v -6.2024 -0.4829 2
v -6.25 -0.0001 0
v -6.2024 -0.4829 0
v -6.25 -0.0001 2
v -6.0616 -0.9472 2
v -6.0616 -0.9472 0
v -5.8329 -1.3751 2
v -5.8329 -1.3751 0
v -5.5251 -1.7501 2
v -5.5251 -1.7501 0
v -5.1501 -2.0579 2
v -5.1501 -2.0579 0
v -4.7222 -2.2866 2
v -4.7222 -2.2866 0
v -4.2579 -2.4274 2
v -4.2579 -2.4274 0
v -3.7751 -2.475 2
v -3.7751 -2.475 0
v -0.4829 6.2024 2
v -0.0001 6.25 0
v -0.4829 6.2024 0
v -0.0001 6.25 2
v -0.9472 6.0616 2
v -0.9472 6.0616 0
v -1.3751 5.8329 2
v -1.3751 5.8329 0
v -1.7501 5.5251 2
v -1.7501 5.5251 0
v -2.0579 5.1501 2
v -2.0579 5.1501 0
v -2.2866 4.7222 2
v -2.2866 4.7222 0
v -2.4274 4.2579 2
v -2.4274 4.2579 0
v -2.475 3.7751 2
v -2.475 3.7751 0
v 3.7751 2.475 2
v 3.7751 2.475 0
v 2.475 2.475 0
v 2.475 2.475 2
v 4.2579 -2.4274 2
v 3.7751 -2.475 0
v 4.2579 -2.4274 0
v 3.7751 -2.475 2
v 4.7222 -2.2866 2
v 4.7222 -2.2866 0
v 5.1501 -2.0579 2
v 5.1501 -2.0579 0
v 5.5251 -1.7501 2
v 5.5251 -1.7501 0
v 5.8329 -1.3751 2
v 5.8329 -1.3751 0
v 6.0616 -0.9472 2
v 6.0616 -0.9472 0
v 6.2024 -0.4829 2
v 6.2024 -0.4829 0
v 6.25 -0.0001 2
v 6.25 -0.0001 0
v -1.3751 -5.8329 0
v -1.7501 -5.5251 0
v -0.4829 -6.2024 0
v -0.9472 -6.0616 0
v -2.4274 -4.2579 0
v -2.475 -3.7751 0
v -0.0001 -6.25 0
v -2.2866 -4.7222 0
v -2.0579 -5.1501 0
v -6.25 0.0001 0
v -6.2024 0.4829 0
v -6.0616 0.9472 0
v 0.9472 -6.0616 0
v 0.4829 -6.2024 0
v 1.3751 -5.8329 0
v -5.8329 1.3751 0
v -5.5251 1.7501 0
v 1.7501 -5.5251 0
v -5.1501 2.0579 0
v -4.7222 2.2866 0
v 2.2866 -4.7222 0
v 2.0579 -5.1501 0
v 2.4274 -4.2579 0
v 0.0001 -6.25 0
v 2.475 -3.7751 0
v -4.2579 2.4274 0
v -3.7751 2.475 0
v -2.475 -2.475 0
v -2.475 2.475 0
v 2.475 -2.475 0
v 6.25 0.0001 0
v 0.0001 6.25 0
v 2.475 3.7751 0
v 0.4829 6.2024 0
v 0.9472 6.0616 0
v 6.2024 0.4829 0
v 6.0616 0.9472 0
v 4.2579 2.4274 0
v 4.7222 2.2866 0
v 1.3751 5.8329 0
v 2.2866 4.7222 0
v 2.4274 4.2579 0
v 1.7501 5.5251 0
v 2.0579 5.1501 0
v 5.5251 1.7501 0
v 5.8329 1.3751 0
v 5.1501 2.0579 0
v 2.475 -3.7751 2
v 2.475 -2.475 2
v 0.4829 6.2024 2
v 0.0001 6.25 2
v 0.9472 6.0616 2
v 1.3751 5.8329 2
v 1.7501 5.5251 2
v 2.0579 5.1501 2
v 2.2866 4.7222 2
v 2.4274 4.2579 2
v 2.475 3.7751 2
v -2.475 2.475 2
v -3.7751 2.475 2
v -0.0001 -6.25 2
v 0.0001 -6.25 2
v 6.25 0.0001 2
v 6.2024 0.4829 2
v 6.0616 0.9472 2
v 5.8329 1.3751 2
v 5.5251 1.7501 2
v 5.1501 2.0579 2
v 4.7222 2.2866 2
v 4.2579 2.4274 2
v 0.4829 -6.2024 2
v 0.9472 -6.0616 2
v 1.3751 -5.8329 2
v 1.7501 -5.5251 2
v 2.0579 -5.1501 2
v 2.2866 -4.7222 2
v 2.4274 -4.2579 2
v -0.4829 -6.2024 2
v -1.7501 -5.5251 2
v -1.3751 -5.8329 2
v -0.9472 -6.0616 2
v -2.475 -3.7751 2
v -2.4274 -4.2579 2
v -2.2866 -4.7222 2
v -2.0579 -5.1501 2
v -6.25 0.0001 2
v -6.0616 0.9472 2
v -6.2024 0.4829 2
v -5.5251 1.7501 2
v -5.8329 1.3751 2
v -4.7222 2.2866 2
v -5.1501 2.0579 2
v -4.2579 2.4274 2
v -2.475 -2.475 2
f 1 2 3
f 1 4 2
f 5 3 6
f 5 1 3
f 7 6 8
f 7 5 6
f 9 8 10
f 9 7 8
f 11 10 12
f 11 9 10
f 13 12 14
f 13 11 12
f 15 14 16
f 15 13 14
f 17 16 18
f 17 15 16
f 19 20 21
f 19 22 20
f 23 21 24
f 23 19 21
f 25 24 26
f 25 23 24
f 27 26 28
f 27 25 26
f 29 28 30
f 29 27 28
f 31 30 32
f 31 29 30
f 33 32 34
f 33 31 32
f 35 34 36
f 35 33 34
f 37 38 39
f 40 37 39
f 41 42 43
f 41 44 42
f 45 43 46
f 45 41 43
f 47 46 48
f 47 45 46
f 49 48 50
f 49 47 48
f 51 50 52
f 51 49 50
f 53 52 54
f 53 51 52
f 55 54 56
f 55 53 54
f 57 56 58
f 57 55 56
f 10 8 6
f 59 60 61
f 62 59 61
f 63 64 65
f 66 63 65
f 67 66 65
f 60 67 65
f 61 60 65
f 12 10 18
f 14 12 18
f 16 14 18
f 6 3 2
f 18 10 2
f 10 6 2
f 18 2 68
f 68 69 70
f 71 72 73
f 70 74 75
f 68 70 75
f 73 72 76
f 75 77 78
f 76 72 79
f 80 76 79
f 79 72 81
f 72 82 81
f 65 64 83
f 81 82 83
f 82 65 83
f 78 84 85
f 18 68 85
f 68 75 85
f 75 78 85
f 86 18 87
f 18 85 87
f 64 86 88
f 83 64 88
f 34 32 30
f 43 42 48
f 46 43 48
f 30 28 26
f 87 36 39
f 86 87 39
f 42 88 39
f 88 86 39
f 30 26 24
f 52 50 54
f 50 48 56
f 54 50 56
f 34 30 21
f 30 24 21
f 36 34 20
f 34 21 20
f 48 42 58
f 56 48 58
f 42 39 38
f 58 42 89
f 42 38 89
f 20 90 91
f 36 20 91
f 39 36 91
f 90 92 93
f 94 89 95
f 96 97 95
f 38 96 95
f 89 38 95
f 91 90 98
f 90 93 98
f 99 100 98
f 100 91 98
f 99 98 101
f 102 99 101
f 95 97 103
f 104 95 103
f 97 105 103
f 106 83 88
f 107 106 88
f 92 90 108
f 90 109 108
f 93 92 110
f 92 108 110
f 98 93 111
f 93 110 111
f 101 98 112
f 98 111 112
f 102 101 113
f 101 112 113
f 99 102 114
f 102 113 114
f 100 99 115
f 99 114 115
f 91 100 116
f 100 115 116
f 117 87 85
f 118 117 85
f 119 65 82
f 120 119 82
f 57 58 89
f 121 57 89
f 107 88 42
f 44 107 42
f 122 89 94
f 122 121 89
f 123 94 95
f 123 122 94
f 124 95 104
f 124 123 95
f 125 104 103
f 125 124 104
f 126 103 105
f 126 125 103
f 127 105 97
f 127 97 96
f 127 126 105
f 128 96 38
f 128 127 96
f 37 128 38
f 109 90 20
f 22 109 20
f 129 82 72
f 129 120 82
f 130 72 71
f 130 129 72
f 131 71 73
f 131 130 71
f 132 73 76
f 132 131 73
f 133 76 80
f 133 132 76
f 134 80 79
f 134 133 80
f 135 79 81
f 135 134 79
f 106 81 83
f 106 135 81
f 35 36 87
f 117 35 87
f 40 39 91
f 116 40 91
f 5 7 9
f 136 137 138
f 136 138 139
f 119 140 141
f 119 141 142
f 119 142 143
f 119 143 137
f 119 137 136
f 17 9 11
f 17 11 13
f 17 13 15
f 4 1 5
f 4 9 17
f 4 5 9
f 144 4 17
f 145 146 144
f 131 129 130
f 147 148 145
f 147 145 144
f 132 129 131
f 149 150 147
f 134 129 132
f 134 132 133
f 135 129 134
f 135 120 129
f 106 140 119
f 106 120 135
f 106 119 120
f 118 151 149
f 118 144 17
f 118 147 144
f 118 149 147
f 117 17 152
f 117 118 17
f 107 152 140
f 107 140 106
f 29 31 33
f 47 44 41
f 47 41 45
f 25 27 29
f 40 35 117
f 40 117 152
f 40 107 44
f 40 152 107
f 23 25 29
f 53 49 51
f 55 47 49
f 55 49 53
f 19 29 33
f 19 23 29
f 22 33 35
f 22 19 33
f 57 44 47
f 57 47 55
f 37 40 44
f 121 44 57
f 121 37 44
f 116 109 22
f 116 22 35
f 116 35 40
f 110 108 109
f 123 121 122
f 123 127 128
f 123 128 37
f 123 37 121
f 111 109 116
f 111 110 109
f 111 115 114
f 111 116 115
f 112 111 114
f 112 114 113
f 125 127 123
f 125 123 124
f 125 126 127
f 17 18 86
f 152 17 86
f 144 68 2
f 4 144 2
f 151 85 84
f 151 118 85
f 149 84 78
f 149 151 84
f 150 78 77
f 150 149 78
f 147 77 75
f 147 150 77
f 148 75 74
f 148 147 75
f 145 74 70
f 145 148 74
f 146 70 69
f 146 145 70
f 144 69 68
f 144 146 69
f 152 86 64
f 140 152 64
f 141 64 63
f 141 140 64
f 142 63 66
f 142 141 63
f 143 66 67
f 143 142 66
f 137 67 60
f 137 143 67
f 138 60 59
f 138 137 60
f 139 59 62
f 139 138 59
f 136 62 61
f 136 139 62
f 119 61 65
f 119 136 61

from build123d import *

# Parameters (mm, degrees)
BOSS_EXTRUDE1_DEPTH = 2
FILLET1_R           = 2.475


with BuildPart() as part:
    # Sketch1 → Boss-Extrude1 (new body)
    with BuildSketch(Plane.XY):
        Polygon((2.475, 6.25), (-2.475, 6.25), (-2.475, 2.475), (-6.25, 2.475), (-6.25, -2.475), (-2.475, -2.475), (-2.475, -6.25), (2.475, -6.25), (2.475, -2.475), (6.25, -2.475), (6.25, 2.475), (2.475, 2.475), align=None)
    extrude(amount=BOSS_EXTRUDE1_DEPTH)

    # Fillet1
    fillet1_edges = [part.edges().sort_by_distance(p)[0] for p in [
        (2.475, 6.25, 1),
        (6.25, 2.475, 1),
        (6.25, -2.475, 1),
        (2.475, -6.25, 1),
        (-2.475, -6.25, 1),
        (-6.25, -2.475, 1),
        (-6.25, 2.475, 1),
        (-2.475, 6.25, 1),
    ]]
    fillet(fillet1_edges, radius=FILLET1_R - 0.0001)  # a hair under: the kernel refuses the full size


solid = part.part
